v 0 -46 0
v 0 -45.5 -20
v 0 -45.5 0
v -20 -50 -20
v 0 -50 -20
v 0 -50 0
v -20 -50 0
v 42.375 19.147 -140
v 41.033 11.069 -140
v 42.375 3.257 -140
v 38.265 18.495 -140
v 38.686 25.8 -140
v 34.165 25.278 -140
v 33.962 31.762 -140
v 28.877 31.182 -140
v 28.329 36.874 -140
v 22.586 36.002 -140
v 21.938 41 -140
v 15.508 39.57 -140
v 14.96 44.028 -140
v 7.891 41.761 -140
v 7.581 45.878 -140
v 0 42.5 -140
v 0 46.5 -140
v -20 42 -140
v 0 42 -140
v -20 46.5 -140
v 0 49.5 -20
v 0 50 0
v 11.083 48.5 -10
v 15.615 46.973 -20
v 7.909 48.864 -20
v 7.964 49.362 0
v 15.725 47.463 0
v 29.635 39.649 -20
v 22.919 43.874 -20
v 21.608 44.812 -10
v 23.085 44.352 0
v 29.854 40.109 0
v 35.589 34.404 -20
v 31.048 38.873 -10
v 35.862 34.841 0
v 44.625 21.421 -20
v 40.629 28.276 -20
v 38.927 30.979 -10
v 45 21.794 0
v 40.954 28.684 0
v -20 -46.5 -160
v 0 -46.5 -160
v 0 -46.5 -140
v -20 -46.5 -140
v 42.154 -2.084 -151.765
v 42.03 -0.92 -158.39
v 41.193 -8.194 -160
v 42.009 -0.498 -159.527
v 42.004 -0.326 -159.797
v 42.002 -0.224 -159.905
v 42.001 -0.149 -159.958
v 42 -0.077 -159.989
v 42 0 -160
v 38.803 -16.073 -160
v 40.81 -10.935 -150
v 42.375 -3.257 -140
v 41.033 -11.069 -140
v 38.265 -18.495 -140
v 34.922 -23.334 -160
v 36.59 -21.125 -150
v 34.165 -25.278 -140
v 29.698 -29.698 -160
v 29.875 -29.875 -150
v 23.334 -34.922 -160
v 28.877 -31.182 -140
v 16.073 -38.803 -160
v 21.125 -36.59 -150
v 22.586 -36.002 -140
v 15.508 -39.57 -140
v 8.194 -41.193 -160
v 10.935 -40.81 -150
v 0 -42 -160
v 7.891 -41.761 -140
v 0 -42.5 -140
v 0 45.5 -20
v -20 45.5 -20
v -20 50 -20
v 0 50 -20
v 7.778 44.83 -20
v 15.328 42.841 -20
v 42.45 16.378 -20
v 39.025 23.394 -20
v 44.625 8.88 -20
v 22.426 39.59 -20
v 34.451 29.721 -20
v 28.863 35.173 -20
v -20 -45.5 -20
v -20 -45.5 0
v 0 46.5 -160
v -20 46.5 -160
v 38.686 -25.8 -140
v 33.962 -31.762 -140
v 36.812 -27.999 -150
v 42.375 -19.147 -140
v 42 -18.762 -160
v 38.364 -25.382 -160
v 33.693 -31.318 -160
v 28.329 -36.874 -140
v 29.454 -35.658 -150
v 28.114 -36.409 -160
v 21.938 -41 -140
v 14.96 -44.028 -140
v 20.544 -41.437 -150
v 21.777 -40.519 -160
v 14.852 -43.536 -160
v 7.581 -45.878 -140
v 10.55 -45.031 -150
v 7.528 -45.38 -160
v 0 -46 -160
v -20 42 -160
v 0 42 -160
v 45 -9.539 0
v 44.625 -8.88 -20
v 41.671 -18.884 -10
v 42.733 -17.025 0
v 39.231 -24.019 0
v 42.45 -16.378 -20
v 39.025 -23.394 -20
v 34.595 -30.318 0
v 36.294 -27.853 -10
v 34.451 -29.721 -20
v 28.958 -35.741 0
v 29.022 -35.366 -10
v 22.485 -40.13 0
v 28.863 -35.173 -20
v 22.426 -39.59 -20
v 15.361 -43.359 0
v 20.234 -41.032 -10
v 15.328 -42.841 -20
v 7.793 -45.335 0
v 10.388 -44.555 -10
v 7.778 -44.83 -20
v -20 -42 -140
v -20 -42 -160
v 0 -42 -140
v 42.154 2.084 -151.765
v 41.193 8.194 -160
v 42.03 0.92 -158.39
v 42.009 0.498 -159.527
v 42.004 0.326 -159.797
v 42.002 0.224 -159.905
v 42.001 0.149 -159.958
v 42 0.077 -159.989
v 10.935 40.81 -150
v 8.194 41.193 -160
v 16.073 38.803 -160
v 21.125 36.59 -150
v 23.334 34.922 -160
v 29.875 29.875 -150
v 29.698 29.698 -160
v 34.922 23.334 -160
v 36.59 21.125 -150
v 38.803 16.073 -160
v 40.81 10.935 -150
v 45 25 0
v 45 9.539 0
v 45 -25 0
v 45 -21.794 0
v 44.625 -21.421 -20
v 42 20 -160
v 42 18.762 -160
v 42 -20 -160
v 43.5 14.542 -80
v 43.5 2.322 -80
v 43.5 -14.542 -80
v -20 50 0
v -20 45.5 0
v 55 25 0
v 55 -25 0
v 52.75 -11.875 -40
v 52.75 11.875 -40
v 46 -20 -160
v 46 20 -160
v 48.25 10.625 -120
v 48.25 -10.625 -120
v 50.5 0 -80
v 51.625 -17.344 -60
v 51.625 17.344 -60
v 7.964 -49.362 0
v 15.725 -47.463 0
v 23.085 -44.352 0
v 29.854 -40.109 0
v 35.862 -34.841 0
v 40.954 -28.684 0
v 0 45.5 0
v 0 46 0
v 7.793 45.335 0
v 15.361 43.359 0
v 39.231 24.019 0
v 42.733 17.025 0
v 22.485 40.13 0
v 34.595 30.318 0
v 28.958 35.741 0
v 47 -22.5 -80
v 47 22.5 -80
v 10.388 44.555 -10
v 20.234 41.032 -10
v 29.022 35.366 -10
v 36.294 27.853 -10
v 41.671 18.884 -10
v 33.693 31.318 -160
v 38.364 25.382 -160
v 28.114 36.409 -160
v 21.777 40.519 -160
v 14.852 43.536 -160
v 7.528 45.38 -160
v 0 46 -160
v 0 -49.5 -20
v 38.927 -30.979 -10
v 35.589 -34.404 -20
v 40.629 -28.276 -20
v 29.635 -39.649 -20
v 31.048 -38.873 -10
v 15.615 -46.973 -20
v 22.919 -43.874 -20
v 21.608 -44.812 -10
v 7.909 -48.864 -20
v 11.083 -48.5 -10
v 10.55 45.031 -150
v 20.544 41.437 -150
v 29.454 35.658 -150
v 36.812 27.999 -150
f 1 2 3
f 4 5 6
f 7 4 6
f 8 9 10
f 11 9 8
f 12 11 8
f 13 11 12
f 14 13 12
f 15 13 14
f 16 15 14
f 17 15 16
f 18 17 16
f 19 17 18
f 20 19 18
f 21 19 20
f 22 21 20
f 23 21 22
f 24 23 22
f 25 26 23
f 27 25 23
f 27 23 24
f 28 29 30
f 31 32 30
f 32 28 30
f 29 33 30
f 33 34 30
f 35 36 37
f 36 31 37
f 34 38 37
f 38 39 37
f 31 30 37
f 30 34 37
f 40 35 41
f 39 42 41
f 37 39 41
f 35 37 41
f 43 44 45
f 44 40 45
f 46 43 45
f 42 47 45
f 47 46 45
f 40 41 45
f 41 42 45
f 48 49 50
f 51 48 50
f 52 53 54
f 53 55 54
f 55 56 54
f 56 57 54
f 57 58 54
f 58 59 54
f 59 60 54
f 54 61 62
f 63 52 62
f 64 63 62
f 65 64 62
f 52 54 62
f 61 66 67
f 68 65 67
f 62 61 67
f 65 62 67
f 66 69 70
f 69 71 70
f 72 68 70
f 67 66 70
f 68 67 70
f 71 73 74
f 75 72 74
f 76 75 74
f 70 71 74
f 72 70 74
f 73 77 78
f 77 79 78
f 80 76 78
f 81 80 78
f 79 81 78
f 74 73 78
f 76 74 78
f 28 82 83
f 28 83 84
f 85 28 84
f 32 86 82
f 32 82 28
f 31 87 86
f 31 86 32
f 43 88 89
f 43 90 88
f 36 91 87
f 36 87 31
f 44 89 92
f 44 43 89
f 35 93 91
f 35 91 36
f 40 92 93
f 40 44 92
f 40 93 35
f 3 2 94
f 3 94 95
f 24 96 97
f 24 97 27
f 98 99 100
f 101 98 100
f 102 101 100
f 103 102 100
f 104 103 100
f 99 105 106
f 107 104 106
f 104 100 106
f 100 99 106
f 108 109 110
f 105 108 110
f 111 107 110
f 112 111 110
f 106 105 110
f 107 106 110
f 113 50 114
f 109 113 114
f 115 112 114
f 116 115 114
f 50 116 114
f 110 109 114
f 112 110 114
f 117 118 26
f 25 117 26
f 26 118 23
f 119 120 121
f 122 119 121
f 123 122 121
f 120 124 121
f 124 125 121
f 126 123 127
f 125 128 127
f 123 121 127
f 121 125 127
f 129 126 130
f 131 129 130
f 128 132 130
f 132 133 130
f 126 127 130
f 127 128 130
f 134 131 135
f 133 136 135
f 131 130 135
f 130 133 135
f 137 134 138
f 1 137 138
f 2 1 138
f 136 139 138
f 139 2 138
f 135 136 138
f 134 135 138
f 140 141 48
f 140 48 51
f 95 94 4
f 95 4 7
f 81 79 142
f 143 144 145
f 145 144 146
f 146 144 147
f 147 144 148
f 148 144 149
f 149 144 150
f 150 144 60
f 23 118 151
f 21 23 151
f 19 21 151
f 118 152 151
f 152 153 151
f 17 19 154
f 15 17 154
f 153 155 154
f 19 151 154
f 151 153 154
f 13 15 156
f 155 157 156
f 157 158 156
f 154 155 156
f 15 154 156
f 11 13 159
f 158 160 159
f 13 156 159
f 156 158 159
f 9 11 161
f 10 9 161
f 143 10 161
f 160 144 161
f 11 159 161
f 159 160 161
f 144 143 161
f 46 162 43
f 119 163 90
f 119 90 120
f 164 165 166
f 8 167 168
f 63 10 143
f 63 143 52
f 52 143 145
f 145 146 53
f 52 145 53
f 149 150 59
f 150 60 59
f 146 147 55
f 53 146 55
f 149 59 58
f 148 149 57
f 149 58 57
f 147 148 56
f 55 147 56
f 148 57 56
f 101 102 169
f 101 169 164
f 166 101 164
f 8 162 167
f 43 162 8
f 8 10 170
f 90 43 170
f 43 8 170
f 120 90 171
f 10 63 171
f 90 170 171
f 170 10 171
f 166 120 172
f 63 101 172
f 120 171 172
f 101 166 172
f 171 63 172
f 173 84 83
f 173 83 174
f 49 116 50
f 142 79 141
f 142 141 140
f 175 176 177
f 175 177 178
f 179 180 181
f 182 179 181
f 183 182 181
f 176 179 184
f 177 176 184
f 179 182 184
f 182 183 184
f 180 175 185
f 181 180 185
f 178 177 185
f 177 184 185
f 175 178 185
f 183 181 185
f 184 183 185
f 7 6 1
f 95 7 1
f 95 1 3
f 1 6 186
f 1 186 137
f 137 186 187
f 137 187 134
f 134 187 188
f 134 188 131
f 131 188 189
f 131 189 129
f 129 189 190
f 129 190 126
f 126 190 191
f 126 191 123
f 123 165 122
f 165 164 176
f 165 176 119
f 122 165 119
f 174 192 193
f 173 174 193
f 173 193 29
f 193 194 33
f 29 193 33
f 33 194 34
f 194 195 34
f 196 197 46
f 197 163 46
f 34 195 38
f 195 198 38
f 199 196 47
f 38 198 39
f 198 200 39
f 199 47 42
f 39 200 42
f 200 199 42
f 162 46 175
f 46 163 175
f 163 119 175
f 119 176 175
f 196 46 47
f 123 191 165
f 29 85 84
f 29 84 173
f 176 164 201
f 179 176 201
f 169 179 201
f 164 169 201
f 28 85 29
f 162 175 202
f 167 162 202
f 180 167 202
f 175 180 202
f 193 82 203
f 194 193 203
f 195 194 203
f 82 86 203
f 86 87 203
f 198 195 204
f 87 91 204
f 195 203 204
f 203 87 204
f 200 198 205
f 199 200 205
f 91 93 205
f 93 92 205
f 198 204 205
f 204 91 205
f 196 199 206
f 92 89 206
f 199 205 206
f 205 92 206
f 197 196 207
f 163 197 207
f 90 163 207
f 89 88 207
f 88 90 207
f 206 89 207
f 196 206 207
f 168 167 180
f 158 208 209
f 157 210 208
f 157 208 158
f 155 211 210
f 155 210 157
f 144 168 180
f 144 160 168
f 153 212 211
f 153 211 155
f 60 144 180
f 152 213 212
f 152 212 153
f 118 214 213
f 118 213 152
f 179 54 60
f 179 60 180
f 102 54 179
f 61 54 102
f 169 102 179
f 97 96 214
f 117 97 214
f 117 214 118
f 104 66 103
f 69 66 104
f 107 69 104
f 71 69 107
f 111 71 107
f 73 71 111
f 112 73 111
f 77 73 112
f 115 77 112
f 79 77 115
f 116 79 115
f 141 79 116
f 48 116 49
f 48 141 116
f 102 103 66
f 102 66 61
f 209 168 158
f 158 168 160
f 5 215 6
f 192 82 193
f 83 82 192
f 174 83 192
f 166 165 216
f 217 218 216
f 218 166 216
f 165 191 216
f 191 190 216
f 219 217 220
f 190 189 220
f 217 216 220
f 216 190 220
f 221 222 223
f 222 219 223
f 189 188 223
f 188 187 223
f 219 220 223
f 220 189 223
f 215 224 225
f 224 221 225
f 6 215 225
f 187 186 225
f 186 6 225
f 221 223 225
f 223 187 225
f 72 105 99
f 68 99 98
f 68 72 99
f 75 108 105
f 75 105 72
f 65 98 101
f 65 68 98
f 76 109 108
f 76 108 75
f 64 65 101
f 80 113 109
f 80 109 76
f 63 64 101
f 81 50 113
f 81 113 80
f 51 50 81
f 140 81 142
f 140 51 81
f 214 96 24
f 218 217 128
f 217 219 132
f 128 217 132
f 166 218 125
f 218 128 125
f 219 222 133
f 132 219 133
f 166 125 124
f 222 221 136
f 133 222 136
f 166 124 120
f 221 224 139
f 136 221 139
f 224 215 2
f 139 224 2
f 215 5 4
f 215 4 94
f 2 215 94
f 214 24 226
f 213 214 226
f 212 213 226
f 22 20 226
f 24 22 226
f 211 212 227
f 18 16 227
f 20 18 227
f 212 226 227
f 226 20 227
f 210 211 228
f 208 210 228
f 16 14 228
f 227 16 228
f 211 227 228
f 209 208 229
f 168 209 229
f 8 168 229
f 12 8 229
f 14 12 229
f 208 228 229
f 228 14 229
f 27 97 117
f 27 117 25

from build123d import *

# Parameters (mm, degrees)
REVOLVE_1_ANGLE     = 180
SKETCH_2_W          = 120
SKETCH_2_H          = 124.466444362
CUT_EXTRUDE_1_DEPTH = 175.928556845
SKETCH_6_W          = 20
SKETCH_6_H          = 4.5
EXTRUDE_1_DEPTH     = 20


with BuildPart() as part:
    # 草图1 → 旋转1 (revolve)
    with BuildSketch(Plane(origin=(0, 0, 0), x_dir=(0, 0, -1), z_dir=(1, 0, 0))):
        Polygon((0, 50), (0, 46), (160, 42), (160, 46), align=None)
    revolve(axis=Axis((0, 0, 0), (0, 0, -1)), revolution_arc=REVOLVE_1_ANGLE)

    # 草图2 → 切除-拉伸1 (cut, through all)
    with BuildSketch(Plane(origin=(0, 0, 0), x_dir=(0, 0, -1), z_dir=(1, 0, 0))):
        with Locations((80, -2.118201403)):
            Rectangle(SKETCH_2_W, SKETCH_2_H)
    extrude(amount=CUT_EXTRUDE_1_DEPTH, mode=Mode.SUBTRACT)


with BuildPart() as cut_extrude_1_piece_1:
    # of the separate pieces the step leaves, piece 1, a body of its own (cut_extrude_1_pieces)
    add(part.part.solids().sort_by_distance((0, 50, 0))[0])



with BuildPart() as cut_extrude_1_piece_2:
    # of the separate pieces the step leaves, piece 2, a body of its own (cut_extrude_1_pieces)
    add(part.part.solids().sort_by_distance((0, 46, -160))[0])


with BuildPart() as cut_extrude_1_piece_1_1:
    add(cut_extrude_1_piece_1.part)

    add(cut_extrude_1_piece_2.part)  # 放样1 merges 切除-拉伸1 piece 2
    # 草图3 → 放样1 section 0
    with BuildSketch(Plane.XY):
        with BuildLine():
            Line((55, 25), (45, 25))
            Line((45, 25), (45, -25))
            Line((45, -25), (55, -25))
            Line((55, -25), (55, 25))
        make_face()
    # 草图4 → 放样1 section 1
    with BuildSketch(Plane(origin=(0, 0, -160), x_dir=(-1, 0, 0), z_dir=(0, 0, -1))):
        with BuildLine():
            Line((-46, 20), (-42, 20))
            Line((-42, 20), (-42, -20))
            Line((-42, -20), (-46, -20))
            Line((-46, -20), (-46, 20))
        make_face()
    loft()

    # 草图6 → 凸台-拉伸1 (add)
    with BuildSketch(Plane.ZY):
        with Locations((-10, 47.75)):
            Rectangle(SKETCH_6_W, SKETCH_6_H)
        with Locations((-10, -47.75)):
            Rectangle(SKETCH_6_W, SKETCH_6_H)
        with Locations((-150, -44.25)):
            Rectangle(SKETCH_6_W, SKETCH_6_H)
        with Locations((-150, 44.25)):
            Rectangle(SKETCH_6_W, SKETCH_6_H)
    extrude(amount=EXTRUDE_1_DEPTH)


solid = cut_extrude_1_piece_1_1.part
